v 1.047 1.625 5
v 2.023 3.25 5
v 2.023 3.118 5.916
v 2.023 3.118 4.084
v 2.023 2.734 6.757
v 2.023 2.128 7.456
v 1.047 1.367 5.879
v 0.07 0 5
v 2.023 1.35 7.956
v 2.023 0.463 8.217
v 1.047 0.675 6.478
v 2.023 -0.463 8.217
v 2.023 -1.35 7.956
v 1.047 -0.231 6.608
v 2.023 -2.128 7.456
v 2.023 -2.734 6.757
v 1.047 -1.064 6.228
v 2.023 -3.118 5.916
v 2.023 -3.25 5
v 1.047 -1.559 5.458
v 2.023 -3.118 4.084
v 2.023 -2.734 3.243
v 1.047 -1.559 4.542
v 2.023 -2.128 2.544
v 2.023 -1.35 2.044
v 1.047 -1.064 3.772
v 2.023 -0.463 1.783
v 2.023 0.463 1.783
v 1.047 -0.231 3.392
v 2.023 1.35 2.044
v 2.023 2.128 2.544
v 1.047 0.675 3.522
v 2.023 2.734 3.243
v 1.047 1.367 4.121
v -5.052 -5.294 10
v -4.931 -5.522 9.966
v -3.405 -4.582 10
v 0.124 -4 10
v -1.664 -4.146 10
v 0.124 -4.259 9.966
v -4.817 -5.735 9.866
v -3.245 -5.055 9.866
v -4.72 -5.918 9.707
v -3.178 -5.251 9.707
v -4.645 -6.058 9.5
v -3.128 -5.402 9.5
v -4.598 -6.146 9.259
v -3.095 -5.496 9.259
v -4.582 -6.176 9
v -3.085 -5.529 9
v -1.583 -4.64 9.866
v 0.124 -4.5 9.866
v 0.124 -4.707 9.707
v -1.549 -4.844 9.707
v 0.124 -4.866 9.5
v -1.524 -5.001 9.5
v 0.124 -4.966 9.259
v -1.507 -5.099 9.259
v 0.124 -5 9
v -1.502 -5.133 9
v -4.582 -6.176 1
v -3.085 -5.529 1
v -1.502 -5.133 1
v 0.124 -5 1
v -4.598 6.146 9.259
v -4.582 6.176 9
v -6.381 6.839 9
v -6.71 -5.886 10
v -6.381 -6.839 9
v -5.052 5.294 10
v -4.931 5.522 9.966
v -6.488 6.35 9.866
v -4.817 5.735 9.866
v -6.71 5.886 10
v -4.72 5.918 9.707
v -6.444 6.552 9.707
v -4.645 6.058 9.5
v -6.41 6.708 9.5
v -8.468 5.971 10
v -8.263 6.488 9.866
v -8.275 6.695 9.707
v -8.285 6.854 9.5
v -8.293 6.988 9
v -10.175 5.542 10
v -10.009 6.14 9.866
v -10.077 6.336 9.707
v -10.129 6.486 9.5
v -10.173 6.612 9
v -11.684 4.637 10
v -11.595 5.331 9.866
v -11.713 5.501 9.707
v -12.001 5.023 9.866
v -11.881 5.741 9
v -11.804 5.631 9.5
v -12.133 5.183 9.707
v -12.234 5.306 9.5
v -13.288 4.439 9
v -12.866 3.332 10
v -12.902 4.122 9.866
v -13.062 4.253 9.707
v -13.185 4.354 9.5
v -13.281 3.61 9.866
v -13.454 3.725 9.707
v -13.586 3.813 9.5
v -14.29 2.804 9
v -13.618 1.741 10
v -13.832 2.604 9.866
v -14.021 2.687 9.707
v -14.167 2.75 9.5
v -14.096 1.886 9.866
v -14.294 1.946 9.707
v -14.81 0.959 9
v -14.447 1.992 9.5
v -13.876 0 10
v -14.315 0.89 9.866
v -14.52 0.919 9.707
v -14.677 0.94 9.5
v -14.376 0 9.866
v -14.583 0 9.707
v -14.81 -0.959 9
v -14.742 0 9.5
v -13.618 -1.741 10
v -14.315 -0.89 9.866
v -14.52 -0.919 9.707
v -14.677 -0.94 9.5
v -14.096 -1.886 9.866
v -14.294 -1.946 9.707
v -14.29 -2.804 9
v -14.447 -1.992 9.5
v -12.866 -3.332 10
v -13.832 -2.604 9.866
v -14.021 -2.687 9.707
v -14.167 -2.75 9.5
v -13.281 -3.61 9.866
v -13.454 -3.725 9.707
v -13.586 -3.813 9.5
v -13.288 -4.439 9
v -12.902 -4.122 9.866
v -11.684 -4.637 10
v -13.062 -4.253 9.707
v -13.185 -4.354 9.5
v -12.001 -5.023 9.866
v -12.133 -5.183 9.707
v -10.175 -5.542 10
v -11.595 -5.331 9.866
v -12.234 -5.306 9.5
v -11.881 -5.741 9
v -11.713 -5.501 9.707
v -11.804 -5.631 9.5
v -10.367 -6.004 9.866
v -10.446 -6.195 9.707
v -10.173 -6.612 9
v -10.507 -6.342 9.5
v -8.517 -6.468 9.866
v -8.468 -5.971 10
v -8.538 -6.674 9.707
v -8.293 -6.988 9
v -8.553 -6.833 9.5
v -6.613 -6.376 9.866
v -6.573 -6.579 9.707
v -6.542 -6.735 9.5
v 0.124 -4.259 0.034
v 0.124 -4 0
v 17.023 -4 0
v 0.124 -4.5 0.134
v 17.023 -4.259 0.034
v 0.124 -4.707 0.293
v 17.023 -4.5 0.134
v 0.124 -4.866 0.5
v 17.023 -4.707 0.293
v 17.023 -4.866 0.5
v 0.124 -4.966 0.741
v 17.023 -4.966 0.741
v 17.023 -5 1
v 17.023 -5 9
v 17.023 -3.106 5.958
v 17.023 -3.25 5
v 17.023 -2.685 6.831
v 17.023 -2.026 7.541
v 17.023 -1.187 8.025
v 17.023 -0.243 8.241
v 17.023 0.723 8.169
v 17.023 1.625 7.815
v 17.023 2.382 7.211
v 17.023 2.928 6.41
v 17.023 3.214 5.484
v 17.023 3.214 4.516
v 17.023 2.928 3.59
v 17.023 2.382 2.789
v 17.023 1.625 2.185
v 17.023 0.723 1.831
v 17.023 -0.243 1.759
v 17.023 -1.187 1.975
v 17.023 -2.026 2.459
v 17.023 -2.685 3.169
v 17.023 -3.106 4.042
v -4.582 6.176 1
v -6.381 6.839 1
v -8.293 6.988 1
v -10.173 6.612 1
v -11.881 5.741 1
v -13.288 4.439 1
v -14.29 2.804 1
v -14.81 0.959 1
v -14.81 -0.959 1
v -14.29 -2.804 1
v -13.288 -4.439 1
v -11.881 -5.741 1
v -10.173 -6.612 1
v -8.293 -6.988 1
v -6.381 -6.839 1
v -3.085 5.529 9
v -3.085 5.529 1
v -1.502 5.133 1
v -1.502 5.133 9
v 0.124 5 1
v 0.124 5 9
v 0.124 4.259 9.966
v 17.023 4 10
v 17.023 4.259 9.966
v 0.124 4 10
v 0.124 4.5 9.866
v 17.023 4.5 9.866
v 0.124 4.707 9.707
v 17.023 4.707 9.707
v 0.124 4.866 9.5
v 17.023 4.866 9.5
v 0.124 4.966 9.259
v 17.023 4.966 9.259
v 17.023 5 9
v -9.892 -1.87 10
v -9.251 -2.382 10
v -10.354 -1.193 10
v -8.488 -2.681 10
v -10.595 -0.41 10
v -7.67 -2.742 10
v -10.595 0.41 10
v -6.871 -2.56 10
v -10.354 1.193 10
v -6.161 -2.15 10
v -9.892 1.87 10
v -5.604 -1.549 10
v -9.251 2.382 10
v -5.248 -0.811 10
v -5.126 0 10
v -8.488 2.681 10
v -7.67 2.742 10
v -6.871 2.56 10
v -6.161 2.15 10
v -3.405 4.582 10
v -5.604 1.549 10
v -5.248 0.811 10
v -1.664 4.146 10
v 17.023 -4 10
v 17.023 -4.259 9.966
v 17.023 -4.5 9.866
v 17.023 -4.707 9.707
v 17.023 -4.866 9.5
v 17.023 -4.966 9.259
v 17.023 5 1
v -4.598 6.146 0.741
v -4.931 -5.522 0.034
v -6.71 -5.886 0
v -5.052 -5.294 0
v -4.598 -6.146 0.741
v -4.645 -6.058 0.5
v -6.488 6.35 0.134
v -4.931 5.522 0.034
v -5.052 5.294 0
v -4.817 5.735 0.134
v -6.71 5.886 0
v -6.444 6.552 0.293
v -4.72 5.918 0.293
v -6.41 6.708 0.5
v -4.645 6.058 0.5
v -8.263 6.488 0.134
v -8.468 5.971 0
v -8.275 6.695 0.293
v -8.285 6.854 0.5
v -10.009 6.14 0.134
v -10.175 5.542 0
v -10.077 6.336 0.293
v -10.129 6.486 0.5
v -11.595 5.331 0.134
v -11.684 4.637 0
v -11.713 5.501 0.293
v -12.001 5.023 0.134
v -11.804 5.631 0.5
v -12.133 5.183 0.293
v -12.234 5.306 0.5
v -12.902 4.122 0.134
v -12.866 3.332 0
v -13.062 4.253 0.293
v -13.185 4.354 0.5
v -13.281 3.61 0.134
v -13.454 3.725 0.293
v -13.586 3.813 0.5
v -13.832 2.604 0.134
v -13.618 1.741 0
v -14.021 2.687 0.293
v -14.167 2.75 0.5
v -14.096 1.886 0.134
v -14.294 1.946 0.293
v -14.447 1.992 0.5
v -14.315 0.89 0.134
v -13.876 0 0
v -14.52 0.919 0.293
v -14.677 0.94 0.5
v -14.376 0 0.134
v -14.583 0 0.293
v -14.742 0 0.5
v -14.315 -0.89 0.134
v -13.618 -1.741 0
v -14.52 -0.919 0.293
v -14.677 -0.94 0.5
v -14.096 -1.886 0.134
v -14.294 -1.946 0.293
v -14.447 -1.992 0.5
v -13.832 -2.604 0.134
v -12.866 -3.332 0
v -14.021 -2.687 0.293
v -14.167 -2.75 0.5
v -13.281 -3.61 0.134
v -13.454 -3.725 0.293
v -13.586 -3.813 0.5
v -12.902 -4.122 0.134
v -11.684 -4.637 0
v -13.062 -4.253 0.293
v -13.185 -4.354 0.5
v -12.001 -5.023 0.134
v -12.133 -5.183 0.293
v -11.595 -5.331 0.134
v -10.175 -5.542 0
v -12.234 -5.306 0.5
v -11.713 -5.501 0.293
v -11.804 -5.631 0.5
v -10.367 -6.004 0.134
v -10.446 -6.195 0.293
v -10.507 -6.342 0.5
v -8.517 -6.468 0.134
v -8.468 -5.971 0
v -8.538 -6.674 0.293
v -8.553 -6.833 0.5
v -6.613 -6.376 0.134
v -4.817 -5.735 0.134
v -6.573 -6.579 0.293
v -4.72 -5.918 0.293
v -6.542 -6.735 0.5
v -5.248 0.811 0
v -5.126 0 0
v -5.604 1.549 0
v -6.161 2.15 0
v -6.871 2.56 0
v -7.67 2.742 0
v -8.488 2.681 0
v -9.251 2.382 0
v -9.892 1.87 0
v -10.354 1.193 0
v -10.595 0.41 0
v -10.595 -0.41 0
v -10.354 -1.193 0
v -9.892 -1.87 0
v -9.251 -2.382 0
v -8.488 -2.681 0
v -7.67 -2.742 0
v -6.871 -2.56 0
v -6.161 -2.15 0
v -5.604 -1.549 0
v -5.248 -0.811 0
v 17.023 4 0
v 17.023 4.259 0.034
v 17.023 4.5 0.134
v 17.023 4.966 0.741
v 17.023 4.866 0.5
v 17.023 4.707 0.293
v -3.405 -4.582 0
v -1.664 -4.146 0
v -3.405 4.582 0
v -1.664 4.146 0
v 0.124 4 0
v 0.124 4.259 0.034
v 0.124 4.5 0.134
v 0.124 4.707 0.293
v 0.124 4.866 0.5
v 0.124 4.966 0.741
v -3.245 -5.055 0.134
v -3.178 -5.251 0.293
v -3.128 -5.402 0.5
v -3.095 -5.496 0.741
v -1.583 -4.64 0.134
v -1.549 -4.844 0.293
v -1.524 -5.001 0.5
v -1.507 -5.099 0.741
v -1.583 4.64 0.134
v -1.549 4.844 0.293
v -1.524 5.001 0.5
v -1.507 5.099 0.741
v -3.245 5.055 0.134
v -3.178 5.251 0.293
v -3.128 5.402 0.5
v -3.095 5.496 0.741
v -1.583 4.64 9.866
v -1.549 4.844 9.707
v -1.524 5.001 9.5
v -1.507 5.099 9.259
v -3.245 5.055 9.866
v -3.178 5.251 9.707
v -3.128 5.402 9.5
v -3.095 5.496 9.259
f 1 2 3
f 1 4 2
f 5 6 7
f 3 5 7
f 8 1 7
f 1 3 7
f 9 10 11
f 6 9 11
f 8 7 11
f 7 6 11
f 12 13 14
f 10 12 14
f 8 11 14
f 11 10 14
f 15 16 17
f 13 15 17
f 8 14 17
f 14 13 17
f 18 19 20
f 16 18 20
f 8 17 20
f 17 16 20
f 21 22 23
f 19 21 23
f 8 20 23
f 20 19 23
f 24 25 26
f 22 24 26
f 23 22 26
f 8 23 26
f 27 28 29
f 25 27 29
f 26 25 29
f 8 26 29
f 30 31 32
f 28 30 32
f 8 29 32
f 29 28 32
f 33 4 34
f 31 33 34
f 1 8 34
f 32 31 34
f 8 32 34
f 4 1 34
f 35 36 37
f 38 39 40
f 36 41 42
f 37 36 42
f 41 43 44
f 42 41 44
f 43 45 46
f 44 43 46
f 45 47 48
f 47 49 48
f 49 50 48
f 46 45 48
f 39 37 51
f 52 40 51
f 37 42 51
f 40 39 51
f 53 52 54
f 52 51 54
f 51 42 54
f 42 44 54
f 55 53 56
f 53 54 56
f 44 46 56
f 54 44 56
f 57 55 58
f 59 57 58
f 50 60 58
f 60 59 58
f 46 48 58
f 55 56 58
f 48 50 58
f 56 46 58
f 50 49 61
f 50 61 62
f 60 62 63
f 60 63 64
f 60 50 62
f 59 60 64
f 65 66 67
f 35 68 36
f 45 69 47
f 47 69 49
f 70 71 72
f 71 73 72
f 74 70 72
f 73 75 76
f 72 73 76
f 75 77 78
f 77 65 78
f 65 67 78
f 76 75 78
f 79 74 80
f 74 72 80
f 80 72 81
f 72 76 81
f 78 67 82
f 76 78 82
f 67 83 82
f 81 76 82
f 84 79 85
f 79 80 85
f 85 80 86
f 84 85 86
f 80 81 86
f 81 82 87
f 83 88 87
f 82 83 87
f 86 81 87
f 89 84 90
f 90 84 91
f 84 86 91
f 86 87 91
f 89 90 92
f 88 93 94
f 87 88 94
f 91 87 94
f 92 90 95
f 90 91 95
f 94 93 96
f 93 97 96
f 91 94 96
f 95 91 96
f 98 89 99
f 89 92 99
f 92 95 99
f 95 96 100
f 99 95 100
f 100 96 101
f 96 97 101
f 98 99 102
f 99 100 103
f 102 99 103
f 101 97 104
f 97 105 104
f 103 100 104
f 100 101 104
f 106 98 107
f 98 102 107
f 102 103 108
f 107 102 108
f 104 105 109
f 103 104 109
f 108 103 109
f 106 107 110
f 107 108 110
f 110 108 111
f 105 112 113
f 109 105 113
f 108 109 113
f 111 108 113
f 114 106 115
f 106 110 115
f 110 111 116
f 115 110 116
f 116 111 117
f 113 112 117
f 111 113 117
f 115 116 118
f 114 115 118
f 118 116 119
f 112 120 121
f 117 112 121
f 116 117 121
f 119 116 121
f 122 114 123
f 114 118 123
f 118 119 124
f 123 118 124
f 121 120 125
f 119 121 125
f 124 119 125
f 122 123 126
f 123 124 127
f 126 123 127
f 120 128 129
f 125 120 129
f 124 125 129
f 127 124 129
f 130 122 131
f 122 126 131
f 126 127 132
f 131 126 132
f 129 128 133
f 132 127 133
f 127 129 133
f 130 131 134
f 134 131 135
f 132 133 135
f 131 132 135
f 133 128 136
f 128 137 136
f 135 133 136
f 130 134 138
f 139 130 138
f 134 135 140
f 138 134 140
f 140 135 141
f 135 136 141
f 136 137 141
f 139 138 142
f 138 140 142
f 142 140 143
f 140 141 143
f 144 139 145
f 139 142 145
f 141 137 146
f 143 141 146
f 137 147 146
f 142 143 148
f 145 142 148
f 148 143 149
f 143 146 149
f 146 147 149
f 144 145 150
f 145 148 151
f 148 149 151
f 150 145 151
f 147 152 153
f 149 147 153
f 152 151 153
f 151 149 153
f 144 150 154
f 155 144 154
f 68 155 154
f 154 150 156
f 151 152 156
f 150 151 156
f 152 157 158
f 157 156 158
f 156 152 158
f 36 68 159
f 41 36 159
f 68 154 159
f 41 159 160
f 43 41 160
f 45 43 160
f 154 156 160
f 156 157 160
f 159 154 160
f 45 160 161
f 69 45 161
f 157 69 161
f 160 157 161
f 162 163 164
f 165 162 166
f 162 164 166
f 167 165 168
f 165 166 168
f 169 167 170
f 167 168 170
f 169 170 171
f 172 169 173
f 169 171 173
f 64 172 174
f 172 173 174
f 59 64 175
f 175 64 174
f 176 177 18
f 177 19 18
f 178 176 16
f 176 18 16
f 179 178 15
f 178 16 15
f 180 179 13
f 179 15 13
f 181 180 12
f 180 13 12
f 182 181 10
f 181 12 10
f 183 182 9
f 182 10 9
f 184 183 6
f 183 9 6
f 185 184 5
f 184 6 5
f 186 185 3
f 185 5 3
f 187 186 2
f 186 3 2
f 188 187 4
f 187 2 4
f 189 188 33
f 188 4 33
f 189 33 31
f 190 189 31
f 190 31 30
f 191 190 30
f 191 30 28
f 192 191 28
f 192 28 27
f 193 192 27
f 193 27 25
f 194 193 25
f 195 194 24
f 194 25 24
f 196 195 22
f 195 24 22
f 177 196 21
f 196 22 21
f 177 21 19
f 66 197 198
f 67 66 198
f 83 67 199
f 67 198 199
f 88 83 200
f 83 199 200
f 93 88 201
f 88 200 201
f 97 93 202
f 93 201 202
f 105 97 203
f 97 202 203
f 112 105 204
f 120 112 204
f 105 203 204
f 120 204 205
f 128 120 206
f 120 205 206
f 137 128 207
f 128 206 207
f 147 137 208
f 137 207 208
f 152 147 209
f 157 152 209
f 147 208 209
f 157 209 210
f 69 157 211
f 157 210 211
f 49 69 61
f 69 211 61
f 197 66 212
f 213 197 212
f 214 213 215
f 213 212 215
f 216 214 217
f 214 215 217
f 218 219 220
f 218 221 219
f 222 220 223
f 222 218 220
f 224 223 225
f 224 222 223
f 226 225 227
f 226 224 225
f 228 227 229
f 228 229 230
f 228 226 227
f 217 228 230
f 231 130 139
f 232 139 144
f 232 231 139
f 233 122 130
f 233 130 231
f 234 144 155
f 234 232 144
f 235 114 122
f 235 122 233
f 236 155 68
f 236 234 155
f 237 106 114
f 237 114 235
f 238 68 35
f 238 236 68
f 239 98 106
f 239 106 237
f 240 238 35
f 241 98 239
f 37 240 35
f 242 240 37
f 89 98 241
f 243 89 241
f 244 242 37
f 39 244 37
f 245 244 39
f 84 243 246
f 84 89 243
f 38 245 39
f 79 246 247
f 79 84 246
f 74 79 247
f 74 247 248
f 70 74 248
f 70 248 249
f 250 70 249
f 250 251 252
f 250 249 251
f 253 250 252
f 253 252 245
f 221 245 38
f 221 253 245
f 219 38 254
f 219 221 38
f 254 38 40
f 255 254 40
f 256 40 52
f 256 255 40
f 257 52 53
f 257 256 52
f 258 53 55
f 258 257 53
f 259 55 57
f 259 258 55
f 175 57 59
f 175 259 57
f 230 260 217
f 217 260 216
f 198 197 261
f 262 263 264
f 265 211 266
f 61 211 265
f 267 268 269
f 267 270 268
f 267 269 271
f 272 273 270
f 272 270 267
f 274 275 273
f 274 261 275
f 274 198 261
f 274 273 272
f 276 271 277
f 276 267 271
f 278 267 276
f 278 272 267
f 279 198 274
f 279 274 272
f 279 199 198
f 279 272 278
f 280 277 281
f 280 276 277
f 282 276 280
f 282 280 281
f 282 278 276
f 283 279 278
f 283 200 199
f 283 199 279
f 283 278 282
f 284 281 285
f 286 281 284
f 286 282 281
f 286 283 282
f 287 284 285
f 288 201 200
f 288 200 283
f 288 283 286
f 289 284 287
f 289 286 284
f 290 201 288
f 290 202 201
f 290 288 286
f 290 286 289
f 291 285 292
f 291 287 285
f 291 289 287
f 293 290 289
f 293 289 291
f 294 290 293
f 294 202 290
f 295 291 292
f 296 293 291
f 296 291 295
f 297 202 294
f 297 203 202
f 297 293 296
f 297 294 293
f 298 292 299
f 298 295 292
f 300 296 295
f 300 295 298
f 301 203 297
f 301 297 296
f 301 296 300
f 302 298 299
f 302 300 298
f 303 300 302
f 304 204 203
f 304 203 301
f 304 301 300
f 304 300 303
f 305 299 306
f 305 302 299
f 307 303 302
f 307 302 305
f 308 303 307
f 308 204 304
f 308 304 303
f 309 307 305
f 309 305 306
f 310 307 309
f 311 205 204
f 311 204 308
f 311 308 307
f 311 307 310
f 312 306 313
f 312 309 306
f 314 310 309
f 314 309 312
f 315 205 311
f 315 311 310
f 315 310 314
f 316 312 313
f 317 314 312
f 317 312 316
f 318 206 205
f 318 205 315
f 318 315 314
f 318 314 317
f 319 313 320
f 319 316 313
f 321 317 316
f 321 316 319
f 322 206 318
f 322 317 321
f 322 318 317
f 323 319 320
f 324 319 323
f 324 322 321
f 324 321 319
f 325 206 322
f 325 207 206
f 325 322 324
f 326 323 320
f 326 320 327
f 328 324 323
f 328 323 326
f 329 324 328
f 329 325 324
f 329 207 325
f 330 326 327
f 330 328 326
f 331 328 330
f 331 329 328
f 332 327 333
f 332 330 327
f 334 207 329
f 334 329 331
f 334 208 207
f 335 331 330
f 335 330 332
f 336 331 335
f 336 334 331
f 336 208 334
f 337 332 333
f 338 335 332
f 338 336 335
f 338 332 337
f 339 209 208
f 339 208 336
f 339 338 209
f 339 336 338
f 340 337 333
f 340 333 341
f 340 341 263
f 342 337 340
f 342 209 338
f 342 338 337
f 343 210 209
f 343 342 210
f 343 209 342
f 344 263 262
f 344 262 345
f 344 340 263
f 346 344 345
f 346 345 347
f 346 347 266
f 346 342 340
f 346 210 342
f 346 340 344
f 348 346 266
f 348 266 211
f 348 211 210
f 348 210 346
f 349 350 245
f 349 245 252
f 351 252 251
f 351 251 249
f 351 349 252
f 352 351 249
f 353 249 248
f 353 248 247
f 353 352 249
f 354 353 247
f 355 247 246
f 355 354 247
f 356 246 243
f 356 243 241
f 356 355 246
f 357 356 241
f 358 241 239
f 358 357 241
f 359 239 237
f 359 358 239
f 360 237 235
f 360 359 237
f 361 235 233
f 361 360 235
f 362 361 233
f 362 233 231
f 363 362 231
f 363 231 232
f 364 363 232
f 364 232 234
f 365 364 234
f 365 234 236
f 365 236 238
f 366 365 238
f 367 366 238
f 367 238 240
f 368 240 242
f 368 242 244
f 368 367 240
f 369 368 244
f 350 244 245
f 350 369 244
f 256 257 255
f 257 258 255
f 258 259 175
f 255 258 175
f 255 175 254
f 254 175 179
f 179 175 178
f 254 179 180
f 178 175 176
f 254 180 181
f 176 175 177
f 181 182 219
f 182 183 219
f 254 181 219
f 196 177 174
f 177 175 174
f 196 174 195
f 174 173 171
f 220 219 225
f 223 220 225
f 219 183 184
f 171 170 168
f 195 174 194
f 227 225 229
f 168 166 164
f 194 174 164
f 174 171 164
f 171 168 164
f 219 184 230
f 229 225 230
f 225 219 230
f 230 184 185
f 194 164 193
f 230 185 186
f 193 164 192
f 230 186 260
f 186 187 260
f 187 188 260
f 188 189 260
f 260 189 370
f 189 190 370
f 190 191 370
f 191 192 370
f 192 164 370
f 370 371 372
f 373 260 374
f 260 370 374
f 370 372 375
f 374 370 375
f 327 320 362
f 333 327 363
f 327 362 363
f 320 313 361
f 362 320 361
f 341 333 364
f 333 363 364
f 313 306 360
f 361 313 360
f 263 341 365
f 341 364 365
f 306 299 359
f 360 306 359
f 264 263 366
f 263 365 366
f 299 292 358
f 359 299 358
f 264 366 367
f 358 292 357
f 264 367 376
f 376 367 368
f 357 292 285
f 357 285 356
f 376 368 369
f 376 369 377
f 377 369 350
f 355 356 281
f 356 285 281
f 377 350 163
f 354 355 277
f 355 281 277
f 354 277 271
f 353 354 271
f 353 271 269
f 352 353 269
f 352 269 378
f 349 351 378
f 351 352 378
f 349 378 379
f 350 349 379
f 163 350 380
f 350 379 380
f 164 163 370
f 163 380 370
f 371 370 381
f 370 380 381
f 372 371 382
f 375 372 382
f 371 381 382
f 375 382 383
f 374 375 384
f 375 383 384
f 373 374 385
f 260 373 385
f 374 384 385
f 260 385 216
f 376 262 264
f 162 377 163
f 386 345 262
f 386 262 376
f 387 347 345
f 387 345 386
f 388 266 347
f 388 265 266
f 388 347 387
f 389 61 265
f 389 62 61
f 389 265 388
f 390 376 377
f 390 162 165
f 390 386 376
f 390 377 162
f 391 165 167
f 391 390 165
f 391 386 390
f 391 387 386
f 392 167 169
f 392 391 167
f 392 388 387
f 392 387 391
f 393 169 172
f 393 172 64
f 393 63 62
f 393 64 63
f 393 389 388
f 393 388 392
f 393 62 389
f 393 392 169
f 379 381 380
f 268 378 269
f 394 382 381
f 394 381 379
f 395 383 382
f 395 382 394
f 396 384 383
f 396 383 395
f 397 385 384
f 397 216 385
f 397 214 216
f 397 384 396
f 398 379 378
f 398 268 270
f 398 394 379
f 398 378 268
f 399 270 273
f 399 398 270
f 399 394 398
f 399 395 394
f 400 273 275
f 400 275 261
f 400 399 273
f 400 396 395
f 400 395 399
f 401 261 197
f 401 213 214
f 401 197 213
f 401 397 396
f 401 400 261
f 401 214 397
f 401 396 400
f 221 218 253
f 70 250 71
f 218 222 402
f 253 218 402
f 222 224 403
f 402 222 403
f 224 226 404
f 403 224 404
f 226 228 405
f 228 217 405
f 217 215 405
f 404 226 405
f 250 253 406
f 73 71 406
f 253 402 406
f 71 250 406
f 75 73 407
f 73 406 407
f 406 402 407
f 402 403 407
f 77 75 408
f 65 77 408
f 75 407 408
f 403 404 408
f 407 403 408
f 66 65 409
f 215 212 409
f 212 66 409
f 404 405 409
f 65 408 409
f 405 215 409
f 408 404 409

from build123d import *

# Parameters (mm, degrees)
F0_R     = 2.75
F1_DEPTH = 10
F2_R     = 10
F3_R     = 1
F5_D     = 6.5
F5_DEPTH = 15
F5_TIP   = 1.9527970118


# Not quite as in the source:
# - a feature names something its author has since deleted; it is built from what else it names


with BuildPart() as f1:
    # F0 (on Top) → F1 (new body)
    with BuildSketch(Plane.XY):
        with BuildLine():
            ThreePointArc((-2.9769337647, -5), (-1.4225088619, -2.7117470016), (-0.8759132502, 0))
            ThreePointArc((-0.8759132502, 0), (-1.4225088619, 2.7117470016), (-2.9769337647, 5))
            ThreePointArc((-2.9769337647, 5), (-14.8759132502, 0), (-2.9769337647, -5))
        make_face()
        with Locations((-7.8759132502, 0)):
            Circle(F0_R, mode=Mode.SUBTRACT)
        with BuildLine():
            ThreePointArc((-2.9769337647, 5), (-1.4225088619, 2.7117470016), (-0.8759132502, 0))
            ThreePointArc((-0.8759132502, 0), (-1.4225088619, -2.7117470016), (-2.9769337647, -5))
            Line((-2.9769337647, -5), (17.0230662353, -5))
            Line((17.0230662353, -5), (17.0230662353, 5))
            Line((17.0230662353, 5), (-2.9769337647, 5))
        make_face()
    extrude(amount=F1_DEPTH)

    # F2
    f2_edges = [f1.edges().sort_by_distance(p)[0] for p in [
        (-2.976934, 5, 5),
        (-2.976934, -5, 5),
    ]]
    fillet(f2_edges, radius=F2_R)

    # F3
    f3_edges = [f1.edges().sort_by_distance(p)[0] for p in [
        (8.573576, 5, 10),
        (-2.30127, 5.298575, 10),
        (8.573576, 5, 0),
    ]]
    fillet(f3_edges, radius=F3_R)

    # F5
    with Locations(Plane.YZ.offset(17.0230662353)):
        with Locations((0, 5)):
            Hole(F5_D / 2, depth=F5_DEPTH)
            with Locations((0, 0, -(F5_DEPTH + F5_TIP / 2))):  # 118° drill point
                Cone(0, F5_D / 2, F5_TIP, mode=Mode.SUBTRACT)


solid = f1.part
